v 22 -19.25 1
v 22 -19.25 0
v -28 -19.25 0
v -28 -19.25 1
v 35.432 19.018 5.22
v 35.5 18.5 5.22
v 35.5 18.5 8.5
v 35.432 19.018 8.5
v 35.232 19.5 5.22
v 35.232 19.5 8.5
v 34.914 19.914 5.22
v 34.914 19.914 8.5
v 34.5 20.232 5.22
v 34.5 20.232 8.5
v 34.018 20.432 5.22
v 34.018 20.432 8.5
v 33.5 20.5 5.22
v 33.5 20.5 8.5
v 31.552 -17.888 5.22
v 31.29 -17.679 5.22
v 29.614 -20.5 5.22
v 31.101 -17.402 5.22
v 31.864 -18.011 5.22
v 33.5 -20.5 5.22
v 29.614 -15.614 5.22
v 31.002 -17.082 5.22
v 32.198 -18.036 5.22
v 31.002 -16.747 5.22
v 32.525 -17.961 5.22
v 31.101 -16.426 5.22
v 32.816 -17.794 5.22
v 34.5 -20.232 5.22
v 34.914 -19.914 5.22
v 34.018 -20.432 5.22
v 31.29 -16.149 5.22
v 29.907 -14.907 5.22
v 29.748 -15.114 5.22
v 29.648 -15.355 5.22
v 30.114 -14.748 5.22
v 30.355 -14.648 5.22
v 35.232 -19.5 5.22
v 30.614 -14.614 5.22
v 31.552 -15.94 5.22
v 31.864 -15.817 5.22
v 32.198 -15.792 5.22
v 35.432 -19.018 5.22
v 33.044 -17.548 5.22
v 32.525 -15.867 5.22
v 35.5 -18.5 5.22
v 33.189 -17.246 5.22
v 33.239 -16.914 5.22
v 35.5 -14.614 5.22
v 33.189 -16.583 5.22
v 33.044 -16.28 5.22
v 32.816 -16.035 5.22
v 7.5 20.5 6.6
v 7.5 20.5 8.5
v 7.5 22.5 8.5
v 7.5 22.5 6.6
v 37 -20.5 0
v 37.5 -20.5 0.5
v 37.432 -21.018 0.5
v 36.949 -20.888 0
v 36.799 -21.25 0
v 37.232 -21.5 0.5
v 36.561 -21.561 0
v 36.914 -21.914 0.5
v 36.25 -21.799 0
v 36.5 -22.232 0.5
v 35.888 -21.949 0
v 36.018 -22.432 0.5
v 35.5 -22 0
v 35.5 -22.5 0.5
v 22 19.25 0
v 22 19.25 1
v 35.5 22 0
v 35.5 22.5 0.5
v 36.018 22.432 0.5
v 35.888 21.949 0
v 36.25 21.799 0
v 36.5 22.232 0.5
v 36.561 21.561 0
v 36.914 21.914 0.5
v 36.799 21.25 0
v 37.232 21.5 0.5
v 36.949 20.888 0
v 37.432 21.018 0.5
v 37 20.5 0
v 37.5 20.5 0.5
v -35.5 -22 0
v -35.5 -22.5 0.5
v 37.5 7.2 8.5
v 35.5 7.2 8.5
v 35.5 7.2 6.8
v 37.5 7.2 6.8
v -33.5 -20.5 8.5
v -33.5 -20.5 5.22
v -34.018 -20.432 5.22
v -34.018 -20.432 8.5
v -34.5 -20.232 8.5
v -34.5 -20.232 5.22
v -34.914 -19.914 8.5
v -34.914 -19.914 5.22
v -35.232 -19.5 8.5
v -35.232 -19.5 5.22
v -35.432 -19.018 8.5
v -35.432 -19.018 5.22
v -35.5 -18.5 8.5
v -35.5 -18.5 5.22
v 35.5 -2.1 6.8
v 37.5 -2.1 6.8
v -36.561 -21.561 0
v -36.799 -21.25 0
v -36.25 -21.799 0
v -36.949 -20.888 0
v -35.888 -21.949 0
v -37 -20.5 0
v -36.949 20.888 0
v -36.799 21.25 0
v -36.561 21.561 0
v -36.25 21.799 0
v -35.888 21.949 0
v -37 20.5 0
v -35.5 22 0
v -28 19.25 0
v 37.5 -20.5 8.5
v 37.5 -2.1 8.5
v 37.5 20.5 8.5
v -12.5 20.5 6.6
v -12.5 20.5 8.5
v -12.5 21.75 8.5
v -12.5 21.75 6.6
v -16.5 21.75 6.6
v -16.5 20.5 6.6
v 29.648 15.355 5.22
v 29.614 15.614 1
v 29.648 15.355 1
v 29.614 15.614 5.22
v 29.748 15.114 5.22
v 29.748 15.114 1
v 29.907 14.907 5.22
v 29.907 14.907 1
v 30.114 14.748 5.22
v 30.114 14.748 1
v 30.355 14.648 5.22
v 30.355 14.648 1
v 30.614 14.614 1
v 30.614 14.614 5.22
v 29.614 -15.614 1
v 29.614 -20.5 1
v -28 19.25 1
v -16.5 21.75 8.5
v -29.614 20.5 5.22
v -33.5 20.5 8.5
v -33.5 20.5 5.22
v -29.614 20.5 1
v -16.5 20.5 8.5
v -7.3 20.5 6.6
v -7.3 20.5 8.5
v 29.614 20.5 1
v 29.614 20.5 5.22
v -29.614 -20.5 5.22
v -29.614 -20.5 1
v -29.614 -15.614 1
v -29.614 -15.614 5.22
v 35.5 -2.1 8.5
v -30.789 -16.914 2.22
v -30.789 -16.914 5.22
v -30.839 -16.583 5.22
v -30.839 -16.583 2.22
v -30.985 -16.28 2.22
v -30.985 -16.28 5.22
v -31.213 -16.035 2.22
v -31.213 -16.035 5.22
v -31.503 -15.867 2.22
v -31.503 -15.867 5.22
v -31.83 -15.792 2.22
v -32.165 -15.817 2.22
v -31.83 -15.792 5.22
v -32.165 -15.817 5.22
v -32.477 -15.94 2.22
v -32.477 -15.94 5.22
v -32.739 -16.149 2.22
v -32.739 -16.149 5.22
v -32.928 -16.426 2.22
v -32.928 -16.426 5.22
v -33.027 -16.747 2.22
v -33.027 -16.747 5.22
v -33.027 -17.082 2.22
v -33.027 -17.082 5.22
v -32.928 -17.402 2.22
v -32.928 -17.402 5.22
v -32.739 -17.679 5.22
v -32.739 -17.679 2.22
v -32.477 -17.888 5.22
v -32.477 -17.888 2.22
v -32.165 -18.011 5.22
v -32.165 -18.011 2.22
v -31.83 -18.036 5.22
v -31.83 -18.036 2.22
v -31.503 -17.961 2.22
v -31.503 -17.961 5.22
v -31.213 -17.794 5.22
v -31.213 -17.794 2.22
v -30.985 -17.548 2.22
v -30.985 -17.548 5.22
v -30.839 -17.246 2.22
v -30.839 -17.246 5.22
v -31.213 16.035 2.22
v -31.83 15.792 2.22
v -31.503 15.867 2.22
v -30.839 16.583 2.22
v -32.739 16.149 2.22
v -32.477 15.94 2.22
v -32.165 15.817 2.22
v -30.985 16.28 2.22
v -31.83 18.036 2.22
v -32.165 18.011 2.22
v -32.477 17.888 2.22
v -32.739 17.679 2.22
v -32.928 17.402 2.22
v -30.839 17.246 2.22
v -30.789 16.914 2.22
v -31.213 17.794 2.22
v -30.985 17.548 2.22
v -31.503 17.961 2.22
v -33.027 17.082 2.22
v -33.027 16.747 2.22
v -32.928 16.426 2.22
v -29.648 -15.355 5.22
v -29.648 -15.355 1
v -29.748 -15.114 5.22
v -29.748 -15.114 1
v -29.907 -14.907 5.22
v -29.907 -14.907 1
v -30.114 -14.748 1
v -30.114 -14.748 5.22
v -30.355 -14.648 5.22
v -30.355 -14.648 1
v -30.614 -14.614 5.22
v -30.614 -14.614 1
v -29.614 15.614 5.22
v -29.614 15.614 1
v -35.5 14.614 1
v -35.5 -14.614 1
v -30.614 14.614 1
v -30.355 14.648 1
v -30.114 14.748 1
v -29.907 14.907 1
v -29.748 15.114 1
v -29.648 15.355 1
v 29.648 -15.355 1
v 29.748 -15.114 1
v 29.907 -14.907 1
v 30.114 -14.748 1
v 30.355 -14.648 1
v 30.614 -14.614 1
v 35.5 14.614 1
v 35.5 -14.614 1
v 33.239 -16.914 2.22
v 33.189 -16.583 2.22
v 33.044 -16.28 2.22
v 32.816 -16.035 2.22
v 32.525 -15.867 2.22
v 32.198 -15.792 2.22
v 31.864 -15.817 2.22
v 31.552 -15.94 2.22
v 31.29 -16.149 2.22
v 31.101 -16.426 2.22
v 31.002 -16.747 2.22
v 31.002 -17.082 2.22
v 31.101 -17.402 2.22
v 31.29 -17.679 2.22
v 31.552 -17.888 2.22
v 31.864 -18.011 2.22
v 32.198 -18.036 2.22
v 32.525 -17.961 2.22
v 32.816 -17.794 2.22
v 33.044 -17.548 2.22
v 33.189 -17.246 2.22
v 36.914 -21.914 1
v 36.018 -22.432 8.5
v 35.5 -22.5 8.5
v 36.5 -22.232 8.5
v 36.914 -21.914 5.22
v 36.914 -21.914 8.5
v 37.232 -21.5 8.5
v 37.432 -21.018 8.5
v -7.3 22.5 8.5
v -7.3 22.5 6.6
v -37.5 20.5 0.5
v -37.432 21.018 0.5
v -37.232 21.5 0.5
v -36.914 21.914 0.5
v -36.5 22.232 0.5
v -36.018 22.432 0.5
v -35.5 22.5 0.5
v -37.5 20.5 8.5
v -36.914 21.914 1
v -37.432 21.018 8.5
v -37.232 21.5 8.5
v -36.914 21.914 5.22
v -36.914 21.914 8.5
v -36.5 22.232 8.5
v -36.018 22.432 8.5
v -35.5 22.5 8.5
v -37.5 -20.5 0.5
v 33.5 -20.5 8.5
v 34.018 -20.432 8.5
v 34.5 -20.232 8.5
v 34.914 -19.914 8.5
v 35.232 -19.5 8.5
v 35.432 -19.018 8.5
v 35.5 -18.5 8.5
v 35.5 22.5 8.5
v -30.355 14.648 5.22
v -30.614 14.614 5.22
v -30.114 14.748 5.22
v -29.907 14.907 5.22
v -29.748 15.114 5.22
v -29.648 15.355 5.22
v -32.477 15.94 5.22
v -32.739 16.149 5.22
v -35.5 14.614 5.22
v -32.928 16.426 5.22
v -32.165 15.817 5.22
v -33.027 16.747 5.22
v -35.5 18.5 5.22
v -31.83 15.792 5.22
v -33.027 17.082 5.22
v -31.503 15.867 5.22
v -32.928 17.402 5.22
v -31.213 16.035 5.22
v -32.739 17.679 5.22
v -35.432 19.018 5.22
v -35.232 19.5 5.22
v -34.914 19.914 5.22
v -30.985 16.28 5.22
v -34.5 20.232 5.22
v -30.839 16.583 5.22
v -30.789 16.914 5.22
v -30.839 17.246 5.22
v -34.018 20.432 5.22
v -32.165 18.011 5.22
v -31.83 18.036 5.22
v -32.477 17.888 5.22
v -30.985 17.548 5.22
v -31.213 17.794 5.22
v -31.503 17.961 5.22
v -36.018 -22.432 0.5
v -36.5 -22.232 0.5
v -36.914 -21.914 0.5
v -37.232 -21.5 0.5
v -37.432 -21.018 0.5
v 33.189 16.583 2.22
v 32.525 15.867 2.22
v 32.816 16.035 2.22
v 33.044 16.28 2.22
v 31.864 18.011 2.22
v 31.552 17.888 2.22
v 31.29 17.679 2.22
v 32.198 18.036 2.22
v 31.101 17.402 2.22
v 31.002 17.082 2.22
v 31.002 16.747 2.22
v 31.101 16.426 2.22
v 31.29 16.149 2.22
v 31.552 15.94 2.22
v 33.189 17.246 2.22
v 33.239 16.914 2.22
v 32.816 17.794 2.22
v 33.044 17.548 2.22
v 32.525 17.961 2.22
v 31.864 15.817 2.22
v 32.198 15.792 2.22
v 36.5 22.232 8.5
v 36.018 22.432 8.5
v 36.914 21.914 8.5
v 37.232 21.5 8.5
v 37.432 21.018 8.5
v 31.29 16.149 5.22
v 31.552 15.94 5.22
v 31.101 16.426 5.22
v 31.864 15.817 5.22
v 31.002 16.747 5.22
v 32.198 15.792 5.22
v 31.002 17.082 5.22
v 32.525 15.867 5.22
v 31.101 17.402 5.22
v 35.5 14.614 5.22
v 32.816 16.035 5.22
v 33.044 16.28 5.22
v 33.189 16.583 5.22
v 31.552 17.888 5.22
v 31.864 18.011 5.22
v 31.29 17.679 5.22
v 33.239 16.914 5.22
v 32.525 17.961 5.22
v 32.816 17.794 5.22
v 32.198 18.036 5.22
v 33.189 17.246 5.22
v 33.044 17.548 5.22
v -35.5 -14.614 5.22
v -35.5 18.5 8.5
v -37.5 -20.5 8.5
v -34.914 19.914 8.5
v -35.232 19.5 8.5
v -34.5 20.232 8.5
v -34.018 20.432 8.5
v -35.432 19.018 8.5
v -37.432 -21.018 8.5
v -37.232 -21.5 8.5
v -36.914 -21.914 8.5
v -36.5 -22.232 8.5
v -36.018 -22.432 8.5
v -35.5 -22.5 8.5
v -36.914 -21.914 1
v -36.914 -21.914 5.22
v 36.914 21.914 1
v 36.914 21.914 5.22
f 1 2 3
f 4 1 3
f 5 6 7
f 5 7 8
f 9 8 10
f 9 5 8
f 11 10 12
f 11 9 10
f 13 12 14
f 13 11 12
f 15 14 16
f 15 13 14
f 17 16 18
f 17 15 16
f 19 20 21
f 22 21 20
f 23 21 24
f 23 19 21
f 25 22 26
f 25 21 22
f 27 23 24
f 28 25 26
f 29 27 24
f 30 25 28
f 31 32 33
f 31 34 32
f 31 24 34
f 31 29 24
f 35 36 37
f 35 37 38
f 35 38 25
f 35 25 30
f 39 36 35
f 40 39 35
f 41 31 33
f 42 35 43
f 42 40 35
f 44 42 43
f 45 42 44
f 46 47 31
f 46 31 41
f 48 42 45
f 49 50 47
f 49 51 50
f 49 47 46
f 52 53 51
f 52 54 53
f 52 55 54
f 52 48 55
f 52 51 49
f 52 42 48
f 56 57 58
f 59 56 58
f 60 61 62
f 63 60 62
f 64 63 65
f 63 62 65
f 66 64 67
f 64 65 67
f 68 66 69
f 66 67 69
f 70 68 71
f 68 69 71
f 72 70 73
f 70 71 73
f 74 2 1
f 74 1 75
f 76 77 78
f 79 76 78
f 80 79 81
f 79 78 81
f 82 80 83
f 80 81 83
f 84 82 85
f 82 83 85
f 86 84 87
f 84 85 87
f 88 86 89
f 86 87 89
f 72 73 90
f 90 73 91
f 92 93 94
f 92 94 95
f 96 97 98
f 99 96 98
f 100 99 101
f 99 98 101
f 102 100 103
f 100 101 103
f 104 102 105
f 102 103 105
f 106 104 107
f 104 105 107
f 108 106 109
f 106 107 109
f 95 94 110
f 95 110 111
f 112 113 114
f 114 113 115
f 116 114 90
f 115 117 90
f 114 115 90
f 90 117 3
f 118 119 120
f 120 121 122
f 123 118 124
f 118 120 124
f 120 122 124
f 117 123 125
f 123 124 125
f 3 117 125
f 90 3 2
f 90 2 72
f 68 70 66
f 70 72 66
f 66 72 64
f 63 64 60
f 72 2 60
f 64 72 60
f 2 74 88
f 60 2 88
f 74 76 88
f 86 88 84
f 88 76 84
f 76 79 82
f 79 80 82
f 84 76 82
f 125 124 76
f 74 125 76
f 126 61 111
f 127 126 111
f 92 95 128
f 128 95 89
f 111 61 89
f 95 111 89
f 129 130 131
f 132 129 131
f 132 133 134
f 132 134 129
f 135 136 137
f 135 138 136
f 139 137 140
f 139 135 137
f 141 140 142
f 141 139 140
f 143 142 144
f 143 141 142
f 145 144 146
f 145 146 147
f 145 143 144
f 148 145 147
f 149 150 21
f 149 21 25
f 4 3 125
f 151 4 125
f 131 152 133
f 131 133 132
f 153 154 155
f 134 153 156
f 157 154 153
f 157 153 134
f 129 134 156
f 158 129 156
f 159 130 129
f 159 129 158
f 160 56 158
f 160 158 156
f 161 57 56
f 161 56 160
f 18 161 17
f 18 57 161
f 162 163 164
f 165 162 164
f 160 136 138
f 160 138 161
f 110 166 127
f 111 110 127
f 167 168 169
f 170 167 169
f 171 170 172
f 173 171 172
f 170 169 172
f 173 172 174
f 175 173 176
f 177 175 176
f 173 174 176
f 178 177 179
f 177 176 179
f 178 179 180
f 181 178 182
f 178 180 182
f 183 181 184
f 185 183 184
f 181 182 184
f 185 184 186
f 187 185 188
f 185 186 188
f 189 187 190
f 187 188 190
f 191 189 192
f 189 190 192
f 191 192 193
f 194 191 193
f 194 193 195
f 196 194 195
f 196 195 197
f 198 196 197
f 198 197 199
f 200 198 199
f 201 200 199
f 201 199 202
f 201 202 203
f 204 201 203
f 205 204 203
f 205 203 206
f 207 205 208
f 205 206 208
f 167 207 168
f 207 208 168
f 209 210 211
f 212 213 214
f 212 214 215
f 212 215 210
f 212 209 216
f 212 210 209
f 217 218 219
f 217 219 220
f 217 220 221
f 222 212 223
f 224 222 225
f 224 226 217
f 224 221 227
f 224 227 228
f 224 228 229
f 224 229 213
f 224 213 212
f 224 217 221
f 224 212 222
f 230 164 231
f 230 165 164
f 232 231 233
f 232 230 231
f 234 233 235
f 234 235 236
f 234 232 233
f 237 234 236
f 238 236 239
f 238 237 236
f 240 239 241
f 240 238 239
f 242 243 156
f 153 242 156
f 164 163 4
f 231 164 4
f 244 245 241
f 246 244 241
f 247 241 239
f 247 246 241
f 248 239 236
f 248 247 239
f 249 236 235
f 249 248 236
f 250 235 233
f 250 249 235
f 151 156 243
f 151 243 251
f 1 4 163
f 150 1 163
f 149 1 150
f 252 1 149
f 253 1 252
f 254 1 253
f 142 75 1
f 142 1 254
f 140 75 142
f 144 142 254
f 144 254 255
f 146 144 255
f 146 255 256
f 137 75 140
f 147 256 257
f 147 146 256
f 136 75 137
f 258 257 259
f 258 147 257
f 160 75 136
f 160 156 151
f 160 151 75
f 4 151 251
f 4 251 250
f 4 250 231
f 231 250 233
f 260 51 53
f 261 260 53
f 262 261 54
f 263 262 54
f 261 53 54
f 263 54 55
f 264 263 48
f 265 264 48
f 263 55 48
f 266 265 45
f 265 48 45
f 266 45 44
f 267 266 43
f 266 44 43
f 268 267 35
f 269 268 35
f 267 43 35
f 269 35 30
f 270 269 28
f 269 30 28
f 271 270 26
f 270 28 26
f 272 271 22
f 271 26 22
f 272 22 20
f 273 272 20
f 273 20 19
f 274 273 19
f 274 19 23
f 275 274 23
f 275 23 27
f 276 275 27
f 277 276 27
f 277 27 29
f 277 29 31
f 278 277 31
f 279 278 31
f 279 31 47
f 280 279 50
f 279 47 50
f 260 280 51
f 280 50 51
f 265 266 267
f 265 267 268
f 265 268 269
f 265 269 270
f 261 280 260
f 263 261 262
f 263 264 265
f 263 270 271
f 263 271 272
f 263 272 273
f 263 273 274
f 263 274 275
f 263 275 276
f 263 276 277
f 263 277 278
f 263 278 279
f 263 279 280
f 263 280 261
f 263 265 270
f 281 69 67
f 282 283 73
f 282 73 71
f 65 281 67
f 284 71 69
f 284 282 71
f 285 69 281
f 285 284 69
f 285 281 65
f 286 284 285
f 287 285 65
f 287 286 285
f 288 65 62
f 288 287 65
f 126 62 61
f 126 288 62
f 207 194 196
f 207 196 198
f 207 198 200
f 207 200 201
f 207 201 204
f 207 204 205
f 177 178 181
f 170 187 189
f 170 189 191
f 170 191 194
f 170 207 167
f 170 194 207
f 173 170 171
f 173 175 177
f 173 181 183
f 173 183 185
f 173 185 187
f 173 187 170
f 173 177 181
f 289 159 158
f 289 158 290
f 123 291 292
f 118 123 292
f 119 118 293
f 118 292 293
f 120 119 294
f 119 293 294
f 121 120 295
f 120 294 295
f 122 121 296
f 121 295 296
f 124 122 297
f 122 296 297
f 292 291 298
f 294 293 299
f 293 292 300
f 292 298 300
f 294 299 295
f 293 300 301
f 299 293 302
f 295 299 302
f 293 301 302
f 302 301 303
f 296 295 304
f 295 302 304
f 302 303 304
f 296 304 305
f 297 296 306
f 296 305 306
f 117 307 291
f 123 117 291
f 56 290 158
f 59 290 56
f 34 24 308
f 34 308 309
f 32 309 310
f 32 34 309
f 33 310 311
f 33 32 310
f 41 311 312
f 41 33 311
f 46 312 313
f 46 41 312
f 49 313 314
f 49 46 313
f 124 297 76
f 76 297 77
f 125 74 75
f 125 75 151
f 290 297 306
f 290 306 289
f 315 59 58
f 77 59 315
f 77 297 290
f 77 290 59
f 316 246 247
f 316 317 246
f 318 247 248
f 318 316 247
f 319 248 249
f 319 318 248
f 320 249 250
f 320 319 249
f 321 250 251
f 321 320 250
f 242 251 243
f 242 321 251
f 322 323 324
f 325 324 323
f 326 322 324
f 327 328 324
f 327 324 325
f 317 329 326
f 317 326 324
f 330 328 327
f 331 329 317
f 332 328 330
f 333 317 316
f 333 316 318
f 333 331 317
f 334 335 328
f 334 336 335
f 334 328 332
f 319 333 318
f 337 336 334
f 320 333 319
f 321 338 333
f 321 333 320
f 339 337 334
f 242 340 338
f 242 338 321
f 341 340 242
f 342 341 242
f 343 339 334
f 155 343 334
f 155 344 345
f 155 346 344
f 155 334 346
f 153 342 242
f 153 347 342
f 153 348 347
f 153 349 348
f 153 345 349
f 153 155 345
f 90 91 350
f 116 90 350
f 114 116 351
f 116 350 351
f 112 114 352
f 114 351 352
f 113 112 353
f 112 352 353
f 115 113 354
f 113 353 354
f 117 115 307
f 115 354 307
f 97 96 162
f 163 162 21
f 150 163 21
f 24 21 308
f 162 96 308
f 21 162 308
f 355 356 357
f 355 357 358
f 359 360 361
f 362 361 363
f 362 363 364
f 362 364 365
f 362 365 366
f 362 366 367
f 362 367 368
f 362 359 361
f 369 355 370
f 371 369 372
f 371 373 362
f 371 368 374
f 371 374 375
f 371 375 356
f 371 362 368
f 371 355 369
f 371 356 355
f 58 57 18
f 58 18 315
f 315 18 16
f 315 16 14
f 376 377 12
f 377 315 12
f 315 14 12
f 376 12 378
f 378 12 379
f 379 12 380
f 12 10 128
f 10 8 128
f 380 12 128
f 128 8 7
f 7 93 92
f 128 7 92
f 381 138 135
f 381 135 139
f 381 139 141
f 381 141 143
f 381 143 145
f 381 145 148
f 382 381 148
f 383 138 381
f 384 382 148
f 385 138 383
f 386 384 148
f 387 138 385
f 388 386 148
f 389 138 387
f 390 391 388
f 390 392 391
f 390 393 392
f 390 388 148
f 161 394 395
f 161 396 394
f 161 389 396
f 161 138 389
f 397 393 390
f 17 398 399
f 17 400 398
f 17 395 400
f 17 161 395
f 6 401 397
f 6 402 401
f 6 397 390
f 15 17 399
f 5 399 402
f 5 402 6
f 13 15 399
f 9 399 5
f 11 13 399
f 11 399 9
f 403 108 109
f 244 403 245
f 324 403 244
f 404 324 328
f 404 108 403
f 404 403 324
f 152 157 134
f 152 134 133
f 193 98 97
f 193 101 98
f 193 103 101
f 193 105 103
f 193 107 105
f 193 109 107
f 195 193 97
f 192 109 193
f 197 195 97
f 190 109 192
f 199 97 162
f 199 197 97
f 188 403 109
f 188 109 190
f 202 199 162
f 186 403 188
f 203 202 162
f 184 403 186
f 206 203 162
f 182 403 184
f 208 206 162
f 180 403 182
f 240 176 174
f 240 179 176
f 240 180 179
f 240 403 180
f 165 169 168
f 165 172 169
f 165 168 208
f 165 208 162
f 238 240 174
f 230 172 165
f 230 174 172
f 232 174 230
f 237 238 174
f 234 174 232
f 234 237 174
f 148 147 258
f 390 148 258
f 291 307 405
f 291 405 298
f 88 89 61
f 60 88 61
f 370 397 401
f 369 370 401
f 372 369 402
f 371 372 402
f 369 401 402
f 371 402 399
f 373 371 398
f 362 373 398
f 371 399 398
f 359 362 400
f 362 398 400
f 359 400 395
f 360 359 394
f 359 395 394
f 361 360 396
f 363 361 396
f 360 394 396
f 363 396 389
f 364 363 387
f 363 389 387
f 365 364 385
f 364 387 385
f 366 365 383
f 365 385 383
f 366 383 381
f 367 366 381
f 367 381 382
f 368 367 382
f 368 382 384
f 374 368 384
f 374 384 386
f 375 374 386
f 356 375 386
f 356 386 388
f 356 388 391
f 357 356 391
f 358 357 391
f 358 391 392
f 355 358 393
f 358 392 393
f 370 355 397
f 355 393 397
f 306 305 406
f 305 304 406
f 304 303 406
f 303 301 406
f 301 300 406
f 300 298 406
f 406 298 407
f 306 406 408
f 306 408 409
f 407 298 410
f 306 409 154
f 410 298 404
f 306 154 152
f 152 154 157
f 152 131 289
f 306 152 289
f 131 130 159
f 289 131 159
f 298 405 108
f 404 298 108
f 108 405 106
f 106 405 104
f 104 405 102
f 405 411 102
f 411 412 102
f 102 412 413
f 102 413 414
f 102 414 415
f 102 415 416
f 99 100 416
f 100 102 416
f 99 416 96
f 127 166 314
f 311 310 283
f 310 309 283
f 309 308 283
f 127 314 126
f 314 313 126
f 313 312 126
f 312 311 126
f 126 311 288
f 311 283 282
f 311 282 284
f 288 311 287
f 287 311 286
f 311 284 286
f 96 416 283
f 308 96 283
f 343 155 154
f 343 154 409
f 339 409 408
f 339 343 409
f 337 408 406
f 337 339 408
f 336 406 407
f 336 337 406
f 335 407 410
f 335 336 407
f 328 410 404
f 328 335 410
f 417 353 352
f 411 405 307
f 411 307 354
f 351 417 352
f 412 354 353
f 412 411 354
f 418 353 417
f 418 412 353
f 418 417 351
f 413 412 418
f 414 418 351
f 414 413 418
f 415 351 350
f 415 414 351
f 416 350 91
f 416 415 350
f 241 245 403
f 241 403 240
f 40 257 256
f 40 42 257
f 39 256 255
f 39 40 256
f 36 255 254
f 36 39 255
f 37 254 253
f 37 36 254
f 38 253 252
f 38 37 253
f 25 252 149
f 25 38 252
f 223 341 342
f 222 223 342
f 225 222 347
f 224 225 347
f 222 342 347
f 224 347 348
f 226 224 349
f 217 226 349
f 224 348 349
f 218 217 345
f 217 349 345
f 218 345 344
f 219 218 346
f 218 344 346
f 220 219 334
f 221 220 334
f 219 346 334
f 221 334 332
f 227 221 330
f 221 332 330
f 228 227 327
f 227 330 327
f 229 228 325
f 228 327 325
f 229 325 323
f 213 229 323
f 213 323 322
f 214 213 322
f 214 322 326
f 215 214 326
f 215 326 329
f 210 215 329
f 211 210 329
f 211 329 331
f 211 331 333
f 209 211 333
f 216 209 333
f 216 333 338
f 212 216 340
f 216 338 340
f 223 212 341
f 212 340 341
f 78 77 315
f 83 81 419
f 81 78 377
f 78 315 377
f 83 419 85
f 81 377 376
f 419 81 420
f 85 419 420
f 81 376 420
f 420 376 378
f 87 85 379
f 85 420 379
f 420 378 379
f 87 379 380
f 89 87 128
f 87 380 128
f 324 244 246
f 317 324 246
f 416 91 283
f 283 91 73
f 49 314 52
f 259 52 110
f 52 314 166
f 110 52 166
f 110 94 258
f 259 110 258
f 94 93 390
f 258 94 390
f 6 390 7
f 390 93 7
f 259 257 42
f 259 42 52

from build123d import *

# Parameters (mm, degrees)
SKICA1_W                 = 75
SKICA1_H                 = 45
P_IDAT_VYSUNUT_M1_DEPTH  = 13
SKICA2_W                 = 71
SKICA2_H                 = 41
ODEBRAT_VYSUNUT_M1_DEPTH = 12
ZAOBLIT1_R               = 2
ZKOSEN_2_SIZE            = 0.5
SKICA3_W                 = 50
SKICA3_H                 = 38.5
ODEBRAT_VYSUNUT_M2_DEPTH = 6
SKICA4_W                 = 7.3
SKICA4_H                 = 7.3
P_IDAT_VYSUNUT_M2_DEPTH  = 4.22
ZAOBLIT2_R               = 1
SKICA6_W                 = 92.209043038
SKICA6_H                 = 16.914138174
ODEBRAT_VYSUNUT_M3_DEPTH = 64.22
SKICA5_W                 = 5.279513812
SKICA5_H                 = 9.3
ODEBRAT_VYSUNUT_M4_DEPTH = 6.2
SKICA7_W                 = 4
SKICA7_H                 = 7.314220015
ODEBRAT_VYSUNUT_M5_DEPTH = 1.9
SKICA8_W                 = 14.8
SKICA8_H                 = 7.292326558
ODEBRAT_VYSUNUT_M6_DEPTH = 1.9
SKICA9_R                 = 1.125
ODEBRAT_VYSUNUT_M7_DEPTH = 3


with BuildPart() as part:
    # Skica1 → Přidat vysunutím1 (new body)
    with BuildSketch(Plane.XY):
        Rectangle(SKICA1_W, SKICA1_H)
    extrude(amount=P_IDAT_VYSUNUT_M1_DEPTH)

    # Skica2 → Odebrat vysunutím1 (cut)
    with BuildSketch(Plane.XY.offset(13)):
        Rectangle(SKICA2_W, SKICA2_H)
    extrude(amount=-ODEBRAT_VYSUNUT_M1_DEPTH, mode=Mode.SUBTRACT)

    # Zaoblit1
    zaoblit1_edges = [part.edges().sort_by_distance(p)[0] for p in [
        (35.5, 20.5, 7),
        (35.5, -20.5, 7),
        (-35.5, -20.5, 7),
        (-35.5, 20.5, 7),
        (37.5, -22.5, 6.5),
        (-37.5, -22.5, 6.5),
        (-37.5, 22.5, 6.5),
        (37.5, 22.5, 6.5),
    ]]
    fillet(zaoblit1_edges, radius=ZAOBLIT1_R)

    # Zkosení2
    zkosen_2_edges = [part.edges().sort_by_distance(p)[0] for p in [
        (0, 22.5, 0),
        (37.5, 0, 0),
        (0, -22.5, 0),
        (-37.5, 0, 0),
        (-36.914213562, 21.914213562, 0),
        (-36.914213562, -21.914213562, 0),
        (36.914213562, -21.914213562, 0),
        (36.914213562, 21.914213562, 0),
    ]]
    chamfer(zkosen_2_edges, length=ZKOSEN_2_SIZE)

    # Skica3 → Odebrat vysunutím2 (cut, symmetric)
    with BuildSketch(Plane(origin=(0, 0, 0), x_dir=(-1, 0, 0), z_dir=(0, 0, -1))):
        with Locations((3, 0)):
            Rectangle(SKICA3_W, SKICA3_H)
    extrude(amount=ODEBRAT_VYSUNUT_M2_DEPTH, both=True, mode=Mode.SUBTRACT)

    # Skica4 → Přidat vysunutím2 (add)
    with BuildSketch(Plane.XY.offset(1)):
        with Locations((-33.264213562, 18.264213562)):
            Rectangle(SKICA4_W, SKICA4_H)
        with Locations((-33.264213562, -18.264213562)):
            Rectangle(SKICA4_W, SKICA4_H)
        with Locations((33.264213562, -18.264213562)):
            Rectangle(SKICA4_W, SKICA4_H)
        with Locations((33.264213562, 18.264213562)):
            Rectangle(SKICA4_W, SKICA4_H)
    extrude(amount=P_IDAT_VYSUNUT_M2_DEPTH)

    # Zaoblit2
    zaoblit2_edges = [part.edges().sort_by_distance(p)[0] for p in [
        (-29.614213562, 14.614213562, 3.11),
        (-29.614213562, -14.614213562, 3.11),
        (29.614213562, -14.614213562, 3.11),
        (29.614213562, 14.614213562, 3.11),
    ]]
    fillet(zaoblit2_edges, radius=ZAOBLIT2_R)

    # Skica6 → Odebrat vysunutím3 (cut)
    with BuildSketch(Plane.XZ.offset(22.5)):
        with Locations((-2.449143373, 16.957069087)):
            Rectangle(SKICA6_W, SKICA6_H)
    extrude(amount=-ODEBRAT_VYSUNUT_M3_DEPTH, mode=Mode.SUBTRACT)

    # Skica5 → Odebrat vysunutím4 (cut)
    with BuildSketch(Plane.XY.offset(13)):
        with Locations((36.7595999, 2.55)):
            Rectangle(SKICA5_W, SKICA5_H)
    extrude(amount=-ODEBRAT_VYSUNUT_M4_DEPTH, mode=Mode.SUBTRACT)

    # Skica7 → Odebrat vysunutím5 (cut)
    with BuildSketch(Plane.XY.offset(8.5)):
        with Locations((-14.5, 18.092889993)):
            Rectangle(SKICA7_W, SKICA7_H)
    extrude(amount=-ODEBRAT_VYSUNUT_M5_DEPTH, mode=Mode.SUBTRACT)

    # Skica8 → Odebrat vysunutím6 (cut)
    with BuildSketch(Plane.XY.offset(8.5)):
        with Locations((0.1, 20.570563513)):
            Rectangle(SKICA8_W, SKICA8_H)
    extrude(amount=-ODEBRAT_VYSUNUT_M6_DEPTH, mode=Mode.SUBTRACT)

    # Skica9 → Odebrat vysunutím7 (cut)
    with BuildSketch(Plane.XY.offset(5.22)):
        with Locations((-31.914213562, 16.914213562)):
            Circle(SKICA9_R)
        with Locations((-31.914213562, -16.914213562)):
            Circle(SKICA9_R)
        with Locations((32.114213562, -16.914213562)):
            Circle(SKICA9_R)
        with Locations((32.114213562, 16.914213562)):
            Circle(SKICA9_R)
    extrude(amount=-ODEBRAT_VYSUNUT_M7_DEPTH, mode=Mode.SUBTRACT)


solid = part.part
